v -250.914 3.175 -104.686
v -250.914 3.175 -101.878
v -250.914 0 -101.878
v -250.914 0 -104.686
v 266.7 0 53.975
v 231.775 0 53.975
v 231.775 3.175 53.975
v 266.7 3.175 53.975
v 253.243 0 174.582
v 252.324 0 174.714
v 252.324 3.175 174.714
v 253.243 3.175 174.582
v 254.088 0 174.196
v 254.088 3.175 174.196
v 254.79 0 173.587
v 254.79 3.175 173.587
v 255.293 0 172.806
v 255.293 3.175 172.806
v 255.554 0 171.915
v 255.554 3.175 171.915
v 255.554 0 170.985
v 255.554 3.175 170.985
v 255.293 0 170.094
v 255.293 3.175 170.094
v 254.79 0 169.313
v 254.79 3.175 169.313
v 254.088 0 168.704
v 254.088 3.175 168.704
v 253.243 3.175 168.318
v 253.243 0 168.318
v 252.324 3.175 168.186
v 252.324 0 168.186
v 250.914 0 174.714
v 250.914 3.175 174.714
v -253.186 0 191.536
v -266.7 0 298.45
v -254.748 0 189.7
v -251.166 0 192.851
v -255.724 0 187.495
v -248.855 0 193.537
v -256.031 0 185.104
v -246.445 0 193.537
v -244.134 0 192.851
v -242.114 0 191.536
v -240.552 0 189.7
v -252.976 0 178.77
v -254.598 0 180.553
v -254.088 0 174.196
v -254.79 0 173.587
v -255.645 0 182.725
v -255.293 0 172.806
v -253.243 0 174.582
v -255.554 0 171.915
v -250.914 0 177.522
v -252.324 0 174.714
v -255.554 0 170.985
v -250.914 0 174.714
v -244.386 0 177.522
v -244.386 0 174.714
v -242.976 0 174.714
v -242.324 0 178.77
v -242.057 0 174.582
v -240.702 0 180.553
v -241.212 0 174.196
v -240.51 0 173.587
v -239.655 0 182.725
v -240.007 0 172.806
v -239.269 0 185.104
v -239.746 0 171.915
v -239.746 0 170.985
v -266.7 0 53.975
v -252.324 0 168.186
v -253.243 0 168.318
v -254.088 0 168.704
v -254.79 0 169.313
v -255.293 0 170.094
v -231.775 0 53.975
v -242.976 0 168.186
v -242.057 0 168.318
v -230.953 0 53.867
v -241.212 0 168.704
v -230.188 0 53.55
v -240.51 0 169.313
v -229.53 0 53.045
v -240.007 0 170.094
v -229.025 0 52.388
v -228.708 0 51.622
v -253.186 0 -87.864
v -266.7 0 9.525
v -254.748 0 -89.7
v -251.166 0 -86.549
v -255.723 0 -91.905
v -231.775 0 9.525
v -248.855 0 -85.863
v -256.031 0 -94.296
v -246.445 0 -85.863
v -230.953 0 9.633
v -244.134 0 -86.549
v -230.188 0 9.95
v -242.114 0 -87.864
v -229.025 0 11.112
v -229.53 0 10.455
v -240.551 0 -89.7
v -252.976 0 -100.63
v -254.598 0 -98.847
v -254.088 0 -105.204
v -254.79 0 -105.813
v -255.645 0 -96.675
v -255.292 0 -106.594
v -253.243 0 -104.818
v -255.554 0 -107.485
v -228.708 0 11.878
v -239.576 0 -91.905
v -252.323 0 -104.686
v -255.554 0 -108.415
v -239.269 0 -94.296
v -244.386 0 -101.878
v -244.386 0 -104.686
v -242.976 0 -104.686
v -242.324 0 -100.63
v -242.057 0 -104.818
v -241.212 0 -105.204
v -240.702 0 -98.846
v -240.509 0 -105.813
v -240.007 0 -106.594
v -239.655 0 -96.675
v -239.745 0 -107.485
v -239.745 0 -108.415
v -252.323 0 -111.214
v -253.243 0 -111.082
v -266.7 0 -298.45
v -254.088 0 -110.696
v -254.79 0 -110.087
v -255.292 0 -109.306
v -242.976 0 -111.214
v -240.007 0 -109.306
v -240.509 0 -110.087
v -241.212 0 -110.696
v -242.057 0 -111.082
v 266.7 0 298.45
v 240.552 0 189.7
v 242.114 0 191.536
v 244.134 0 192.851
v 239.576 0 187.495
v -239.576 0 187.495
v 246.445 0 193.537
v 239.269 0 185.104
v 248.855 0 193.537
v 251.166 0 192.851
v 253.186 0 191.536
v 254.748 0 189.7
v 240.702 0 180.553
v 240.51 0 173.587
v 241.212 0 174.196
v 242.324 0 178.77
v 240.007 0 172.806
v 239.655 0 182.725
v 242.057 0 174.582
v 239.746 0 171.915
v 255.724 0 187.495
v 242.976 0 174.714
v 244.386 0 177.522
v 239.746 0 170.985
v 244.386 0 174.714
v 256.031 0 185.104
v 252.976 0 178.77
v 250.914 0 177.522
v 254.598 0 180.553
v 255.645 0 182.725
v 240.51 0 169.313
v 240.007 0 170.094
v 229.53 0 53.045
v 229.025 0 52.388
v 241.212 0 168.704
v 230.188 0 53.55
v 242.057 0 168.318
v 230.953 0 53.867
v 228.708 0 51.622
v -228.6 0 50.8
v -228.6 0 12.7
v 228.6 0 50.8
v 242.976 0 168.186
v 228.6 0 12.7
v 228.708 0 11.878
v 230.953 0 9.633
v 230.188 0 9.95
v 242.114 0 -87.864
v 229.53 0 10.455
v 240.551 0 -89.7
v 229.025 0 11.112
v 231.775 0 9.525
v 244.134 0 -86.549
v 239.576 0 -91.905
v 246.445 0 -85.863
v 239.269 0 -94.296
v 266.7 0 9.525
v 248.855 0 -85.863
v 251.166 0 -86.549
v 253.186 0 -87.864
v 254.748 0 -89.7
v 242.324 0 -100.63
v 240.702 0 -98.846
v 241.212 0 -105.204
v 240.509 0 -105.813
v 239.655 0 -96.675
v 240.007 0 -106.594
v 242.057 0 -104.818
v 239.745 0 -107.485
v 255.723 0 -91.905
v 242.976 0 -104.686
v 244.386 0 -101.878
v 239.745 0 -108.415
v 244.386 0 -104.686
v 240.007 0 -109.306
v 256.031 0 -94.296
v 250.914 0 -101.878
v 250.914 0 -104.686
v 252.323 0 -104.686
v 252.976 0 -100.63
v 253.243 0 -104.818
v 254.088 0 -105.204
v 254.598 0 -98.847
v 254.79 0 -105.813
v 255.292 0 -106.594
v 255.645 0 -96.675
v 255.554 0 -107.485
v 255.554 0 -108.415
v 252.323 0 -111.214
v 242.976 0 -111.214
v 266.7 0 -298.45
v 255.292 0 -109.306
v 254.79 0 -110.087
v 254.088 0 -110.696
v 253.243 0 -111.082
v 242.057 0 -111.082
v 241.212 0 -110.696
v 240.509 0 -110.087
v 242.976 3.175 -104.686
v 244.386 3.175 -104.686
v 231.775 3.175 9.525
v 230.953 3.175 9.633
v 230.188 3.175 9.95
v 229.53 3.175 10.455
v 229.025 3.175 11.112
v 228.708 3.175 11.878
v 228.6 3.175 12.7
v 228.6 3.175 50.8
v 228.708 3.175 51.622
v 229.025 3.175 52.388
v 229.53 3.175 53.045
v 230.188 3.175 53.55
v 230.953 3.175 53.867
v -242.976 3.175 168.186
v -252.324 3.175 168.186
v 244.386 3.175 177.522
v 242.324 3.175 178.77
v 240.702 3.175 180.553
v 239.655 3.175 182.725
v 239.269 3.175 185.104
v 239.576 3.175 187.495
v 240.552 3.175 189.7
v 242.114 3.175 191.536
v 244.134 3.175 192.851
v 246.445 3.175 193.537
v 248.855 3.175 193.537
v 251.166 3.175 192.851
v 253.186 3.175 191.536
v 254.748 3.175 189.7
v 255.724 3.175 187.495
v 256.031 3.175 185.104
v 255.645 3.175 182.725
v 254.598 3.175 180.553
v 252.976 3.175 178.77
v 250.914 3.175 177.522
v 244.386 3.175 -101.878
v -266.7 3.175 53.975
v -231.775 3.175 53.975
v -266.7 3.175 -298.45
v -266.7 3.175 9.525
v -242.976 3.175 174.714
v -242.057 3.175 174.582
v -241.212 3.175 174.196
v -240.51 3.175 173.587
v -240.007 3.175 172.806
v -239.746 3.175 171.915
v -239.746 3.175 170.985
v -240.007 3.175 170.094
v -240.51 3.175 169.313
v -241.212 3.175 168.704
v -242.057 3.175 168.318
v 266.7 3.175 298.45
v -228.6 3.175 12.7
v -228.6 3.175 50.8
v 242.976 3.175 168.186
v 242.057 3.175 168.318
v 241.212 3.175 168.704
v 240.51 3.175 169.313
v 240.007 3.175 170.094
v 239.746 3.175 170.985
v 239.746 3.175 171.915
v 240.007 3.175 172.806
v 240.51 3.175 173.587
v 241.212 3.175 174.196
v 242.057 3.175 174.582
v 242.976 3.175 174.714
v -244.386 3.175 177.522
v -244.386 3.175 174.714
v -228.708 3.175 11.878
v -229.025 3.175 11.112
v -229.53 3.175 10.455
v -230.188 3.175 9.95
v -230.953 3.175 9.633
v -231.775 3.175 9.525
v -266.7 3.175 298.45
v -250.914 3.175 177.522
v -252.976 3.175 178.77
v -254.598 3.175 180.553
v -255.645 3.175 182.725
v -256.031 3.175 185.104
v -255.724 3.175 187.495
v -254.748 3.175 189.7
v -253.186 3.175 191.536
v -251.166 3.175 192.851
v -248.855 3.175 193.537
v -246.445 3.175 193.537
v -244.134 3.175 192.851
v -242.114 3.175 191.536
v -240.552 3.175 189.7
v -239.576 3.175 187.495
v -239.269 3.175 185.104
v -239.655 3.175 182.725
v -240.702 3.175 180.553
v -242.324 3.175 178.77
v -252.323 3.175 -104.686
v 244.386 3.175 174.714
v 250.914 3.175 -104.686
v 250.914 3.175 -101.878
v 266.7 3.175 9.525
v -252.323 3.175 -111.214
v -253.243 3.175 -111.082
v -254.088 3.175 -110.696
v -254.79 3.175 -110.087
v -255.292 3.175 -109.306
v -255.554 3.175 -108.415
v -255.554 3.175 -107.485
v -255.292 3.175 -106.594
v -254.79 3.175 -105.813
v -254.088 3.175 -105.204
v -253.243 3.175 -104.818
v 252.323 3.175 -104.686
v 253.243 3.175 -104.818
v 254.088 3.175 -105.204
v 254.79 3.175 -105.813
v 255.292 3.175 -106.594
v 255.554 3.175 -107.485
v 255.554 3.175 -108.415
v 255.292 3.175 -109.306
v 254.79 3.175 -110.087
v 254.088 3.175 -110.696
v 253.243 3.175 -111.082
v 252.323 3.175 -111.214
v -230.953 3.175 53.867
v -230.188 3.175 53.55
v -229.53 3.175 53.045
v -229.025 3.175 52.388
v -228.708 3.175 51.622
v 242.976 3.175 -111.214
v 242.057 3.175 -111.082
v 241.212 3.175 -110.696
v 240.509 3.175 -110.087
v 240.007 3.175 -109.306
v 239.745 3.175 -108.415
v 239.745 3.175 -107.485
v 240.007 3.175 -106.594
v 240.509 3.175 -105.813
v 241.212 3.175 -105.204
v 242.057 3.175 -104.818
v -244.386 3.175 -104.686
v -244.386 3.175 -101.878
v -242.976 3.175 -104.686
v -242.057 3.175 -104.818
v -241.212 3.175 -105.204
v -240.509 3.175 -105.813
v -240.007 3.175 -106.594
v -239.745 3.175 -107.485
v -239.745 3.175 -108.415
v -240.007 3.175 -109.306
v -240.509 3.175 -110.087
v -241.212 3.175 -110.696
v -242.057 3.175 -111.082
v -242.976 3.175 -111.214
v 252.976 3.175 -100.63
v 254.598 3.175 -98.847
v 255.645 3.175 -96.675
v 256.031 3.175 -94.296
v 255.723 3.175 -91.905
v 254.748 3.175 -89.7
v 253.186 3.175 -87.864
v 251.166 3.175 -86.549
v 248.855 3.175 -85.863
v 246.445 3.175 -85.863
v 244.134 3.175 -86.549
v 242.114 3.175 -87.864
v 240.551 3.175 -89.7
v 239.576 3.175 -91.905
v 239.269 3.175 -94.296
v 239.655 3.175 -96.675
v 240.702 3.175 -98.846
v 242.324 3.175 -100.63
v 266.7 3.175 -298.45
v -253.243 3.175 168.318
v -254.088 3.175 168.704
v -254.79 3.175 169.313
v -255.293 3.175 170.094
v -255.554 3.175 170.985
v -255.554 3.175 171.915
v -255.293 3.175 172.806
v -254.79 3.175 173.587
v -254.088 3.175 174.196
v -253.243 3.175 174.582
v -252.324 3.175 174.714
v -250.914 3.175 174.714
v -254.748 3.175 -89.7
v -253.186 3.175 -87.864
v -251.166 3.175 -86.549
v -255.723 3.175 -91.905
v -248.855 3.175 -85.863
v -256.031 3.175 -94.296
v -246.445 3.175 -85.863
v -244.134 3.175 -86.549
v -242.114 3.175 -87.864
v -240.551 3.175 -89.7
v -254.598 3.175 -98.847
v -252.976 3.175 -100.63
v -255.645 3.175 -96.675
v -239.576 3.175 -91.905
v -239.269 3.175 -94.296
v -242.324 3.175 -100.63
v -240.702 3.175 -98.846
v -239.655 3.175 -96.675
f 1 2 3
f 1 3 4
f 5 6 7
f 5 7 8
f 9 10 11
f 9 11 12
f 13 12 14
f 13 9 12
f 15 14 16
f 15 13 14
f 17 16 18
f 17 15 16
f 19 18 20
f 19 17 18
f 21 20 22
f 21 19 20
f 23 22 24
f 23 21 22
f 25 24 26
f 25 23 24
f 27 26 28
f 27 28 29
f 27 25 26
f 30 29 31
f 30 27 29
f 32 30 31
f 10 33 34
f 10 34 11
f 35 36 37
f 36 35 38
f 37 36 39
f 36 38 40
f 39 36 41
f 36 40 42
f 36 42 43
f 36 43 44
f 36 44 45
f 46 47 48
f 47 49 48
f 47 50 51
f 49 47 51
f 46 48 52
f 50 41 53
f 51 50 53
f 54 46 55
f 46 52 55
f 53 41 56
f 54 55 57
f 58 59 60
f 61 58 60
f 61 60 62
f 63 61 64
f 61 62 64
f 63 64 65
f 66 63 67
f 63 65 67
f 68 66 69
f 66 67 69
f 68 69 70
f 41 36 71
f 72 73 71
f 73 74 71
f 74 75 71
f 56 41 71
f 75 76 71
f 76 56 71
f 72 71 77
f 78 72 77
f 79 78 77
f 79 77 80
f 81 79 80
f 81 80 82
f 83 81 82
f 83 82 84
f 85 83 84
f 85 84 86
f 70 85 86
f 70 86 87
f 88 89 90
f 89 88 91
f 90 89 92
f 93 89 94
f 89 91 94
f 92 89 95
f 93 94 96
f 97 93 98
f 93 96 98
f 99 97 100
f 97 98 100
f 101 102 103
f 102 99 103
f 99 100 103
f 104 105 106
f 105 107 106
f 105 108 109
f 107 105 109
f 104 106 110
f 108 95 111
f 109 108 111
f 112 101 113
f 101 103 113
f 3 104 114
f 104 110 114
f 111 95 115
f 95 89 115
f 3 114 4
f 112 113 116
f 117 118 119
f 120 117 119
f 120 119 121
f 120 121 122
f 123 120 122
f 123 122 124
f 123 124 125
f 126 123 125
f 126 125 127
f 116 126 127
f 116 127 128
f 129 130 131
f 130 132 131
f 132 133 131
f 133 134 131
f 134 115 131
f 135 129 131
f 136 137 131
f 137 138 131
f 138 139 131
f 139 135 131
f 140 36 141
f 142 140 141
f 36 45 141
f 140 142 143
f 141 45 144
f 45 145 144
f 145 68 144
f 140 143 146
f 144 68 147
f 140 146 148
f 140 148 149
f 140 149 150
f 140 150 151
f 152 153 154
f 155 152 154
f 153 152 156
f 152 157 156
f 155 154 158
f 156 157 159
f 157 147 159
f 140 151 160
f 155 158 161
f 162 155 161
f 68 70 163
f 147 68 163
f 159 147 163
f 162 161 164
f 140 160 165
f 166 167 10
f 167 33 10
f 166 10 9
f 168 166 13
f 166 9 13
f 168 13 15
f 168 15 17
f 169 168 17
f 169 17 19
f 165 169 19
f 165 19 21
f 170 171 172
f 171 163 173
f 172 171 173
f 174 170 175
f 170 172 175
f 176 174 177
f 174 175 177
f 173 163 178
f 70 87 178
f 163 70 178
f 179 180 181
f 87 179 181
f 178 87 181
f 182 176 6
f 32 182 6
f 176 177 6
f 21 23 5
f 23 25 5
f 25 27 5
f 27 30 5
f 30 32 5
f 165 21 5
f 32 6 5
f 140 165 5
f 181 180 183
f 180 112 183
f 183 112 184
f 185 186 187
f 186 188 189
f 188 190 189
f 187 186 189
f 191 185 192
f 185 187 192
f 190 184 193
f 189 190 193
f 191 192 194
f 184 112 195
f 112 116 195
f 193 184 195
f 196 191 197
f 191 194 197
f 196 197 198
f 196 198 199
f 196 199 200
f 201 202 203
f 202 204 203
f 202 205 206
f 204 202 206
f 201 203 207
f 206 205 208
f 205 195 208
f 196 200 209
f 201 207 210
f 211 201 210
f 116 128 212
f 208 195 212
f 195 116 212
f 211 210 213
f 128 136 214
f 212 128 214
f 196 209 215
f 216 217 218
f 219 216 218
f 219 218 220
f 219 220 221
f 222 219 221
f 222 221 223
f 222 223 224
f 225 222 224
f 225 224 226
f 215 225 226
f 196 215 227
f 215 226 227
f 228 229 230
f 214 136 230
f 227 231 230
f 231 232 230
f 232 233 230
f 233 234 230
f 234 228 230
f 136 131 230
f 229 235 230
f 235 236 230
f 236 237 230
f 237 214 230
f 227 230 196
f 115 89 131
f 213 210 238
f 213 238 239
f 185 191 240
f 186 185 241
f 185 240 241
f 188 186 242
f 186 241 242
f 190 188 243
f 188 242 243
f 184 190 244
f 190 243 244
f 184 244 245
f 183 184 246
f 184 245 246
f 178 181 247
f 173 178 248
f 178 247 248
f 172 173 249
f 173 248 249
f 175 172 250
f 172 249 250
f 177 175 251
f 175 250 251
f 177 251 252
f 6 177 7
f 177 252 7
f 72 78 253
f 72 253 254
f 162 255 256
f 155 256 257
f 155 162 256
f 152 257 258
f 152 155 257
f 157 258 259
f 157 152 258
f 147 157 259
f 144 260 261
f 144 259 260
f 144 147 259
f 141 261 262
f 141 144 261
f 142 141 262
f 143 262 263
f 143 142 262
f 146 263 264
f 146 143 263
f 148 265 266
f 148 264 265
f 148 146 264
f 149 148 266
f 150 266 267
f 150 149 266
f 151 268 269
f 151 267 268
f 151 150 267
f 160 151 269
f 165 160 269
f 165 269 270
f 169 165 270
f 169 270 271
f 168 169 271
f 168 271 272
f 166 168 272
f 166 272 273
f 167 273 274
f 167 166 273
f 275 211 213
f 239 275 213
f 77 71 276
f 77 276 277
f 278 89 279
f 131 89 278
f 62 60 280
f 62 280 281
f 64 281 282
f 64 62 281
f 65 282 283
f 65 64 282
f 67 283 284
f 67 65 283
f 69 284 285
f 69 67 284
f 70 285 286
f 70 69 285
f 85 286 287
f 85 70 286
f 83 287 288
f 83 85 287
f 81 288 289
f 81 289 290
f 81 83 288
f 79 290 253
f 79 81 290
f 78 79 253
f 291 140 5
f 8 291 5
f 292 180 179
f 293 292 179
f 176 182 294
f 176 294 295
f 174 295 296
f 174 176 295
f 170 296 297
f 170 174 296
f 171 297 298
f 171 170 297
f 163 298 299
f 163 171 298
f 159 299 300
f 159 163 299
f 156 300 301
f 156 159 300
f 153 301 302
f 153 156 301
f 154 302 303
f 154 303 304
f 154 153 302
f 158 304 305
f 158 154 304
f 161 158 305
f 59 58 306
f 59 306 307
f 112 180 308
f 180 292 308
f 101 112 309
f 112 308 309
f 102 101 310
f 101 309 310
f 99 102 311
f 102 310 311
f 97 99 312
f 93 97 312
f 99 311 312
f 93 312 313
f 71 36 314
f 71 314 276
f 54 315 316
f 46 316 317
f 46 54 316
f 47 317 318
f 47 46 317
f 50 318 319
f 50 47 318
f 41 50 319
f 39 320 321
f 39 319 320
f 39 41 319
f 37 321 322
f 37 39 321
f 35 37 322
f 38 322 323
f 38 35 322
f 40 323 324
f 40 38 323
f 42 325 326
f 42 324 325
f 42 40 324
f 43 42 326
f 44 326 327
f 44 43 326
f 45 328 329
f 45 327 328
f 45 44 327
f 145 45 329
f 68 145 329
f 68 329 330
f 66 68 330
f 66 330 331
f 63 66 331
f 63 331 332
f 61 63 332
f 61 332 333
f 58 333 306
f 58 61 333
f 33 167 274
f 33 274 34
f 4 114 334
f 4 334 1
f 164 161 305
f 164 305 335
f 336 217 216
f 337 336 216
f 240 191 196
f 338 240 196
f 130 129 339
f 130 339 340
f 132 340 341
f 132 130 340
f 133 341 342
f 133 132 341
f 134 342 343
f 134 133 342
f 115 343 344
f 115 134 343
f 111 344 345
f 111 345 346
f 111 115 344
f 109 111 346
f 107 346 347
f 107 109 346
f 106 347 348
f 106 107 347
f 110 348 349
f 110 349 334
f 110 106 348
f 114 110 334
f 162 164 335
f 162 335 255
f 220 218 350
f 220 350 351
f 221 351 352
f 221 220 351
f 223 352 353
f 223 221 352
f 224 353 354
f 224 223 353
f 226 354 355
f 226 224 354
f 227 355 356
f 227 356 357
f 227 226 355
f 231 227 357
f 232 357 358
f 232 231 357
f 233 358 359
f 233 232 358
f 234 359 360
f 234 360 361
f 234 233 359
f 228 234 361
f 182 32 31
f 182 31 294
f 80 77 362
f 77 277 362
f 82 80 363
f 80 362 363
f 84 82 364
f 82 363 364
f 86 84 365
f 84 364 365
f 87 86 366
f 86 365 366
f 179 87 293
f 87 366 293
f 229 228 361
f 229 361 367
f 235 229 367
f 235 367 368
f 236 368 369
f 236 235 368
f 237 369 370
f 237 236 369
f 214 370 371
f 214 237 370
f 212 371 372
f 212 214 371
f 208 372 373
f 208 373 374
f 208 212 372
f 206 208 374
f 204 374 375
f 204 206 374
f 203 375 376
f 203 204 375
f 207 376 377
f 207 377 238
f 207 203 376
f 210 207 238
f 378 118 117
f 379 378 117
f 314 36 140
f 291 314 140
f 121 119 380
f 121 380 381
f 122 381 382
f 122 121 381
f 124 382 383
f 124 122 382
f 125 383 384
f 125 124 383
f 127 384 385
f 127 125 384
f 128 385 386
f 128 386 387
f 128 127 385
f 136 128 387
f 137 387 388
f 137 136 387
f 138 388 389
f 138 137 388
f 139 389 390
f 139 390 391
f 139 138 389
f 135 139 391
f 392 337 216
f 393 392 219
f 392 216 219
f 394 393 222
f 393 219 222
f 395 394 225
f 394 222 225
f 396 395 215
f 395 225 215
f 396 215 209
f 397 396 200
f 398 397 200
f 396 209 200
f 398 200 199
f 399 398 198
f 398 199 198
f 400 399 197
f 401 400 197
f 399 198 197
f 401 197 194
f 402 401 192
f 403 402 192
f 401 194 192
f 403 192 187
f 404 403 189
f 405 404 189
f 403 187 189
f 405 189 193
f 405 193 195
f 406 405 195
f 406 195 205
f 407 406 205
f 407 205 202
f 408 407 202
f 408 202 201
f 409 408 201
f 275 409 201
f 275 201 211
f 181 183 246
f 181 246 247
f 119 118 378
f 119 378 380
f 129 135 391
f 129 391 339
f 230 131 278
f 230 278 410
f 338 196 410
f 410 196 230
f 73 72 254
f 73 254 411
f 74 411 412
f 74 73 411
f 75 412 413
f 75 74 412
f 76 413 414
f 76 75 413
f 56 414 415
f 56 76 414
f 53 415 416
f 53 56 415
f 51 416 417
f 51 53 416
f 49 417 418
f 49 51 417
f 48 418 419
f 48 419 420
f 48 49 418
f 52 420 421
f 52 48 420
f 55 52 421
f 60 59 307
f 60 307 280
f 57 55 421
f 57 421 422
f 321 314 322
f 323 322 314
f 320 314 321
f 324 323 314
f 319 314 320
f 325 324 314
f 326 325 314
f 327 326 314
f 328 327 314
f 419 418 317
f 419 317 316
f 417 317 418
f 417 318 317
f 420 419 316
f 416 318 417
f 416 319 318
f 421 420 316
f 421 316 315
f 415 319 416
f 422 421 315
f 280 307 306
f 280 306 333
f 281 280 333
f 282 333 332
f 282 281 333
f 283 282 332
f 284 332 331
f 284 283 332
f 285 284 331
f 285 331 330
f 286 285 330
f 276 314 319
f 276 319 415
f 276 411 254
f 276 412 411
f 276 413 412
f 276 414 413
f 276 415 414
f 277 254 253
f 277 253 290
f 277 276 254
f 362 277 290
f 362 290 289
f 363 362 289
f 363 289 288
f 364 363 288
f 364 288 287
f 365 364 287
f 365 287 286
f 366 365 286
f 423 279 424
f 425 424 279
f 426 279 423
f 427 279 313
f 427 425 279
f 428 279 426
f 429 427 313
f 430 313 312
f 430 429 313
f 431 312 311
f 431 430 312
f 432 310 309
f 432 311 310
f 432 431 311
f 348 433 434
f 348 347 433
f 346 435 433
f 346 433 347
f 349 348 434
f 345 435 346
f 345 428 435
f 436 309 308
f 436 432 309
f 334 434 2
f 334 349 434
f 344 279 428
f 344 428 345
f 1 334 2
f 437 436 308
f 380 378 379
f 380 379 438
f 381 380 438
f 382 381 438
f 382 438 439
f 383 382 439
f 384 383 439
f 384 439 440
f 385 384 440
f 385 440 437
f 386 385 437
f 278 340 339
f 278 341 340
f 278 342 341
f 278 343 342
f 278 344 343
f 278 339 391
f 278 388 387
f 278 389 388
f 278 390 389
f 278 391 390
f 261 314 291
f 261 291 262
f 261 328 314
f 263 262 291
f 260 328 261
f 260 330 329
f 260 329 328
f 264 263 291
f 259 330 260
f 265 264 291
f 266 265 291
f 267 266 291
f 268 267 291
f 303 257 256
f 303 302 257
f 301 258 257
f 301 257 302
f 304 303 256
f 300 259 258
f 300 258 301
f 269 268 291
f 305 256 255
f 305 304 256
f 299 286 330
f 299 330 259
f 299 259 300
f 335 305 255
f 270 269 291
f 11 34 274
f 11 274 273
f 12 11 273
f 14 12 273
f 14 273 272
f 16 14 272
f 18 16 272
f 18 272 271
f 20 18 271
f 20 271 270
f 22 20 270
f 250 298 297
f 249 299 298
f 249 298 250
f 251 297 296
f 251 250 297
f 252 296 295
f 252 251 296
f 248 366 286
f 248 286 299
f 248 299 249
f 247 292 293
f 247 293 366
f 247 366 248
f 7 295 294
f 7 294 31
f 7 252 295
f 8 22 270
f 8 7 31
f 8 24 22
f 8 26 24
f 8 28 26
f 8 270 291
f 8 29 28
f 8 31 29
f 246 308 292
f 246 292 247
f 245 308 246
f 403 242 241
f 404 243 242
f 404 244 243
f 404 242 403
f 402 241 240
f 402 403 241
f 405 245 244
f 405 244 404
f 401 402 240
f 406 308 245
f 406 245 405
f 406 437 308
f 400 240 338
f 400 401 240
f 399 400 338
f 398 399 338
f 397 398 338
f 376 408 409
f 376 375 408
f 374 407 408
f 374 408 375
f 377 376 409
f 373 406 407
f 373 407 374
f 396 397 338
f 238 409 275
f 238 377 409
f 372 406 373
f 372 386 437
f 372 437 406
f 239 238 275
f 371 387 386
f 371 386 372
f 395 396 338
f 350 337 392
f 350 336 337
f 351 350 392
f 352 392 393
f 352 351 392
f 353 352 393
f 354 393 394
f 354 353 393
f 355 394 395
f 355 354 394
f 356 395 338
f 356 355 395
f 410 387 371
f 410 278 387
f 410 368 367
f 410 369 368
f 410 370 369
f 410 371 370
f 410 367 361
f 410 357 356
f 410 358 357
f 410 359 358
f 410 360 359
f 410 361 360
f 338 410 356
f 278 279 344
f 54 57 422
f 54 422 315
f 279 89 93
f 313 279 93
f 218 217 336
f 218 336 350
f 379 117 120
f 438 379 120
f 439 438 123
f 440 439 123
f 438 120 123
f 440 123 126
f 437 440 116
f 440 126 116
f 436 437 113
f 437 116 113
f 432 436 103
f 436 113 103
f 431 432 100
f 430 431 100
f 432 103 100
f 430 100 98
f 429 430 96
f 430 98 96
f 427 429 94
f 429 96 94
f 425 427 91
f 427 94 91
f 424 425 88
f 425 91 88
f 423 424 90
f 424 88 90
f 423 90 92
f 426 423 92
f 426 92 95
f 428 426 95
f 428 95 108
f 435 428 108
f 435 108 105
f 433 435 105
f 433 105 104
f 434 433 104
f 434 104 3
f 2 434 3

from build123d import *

# Parameters (mm, degrees)
SKETCH1_W                    = 533.4
SKETCH1_H                    = 596.9
BOSS_EXTRUDE1_DEPTH          = 3.175
CUT_EXTRUDE1_DEPTH           = 401.264129201
F_0_257_DIAMETER_SLOT1_DEPTH = 3.175
SKETCH8_W                    = 38.1
SKETCH8_H                    = 44.45
CUT_EXTRUDE2_DEPTH           = 401.264129201
FILLET1_R                    = 3.175


# Read off the part's stored shape, not the designer's step: F (0.257) Diameter Slot1
with BuildPart() as part:
    # Sketch1 → Boss-Extrude1 (new body)
    with BuildSketch(Plane(origin=(0, 0, 0), x_dir=(1, 0, 0), z_dir=(0, 1, 0))):
        Rectangle(SKETCH1_W, SKETCH1_H)
    extrude(amount=BOSS_EXTRUDE1_DEPTH)

    # Sketch5 → Cut-Extrude1 (cut, through all)
    with BuildSketch(Plane.XZ):
        with BuildLine():
            Line((244.385805934, -101.878160113), (244.385805934, -107.950617892))
            ThreePointArc((244.385805934, -107.950617892), (247.65, -111.213899987), (250.913605875, -107.950029643))
            Line((250.913605875, -107.950029643), (250.913605875, -101.878279337))
            ThreePointArc((250.913605875, -101.878279337), (247.65, -85.775799987), (244.385805934, -101.878160113))
        make_face()
        with BuildLine():
            Line((250.9139, 177.521780271), (250.9139, 171.450000343))
            ThreePointArc((250.9139, 171.450000343), (247.65, 168.1861), (244.3861, 171.450000343))
            Line((244.3861, 171.450000343), (244.3861, 177.521780271))
            ThreePointArc((244.3861, 177.521780271), (247.65, 193.6242), (250.9139, 177.521780271))
        make_face()
        with BuildLine():
            Line((-244.3861, 177.521780271), (-244.3861, 171.450000343))
            ThreePointArc((-244.3861, 171.450000343), (-247.65, 168.1861), (-250.9139, 171.450000343))
            Line((-250.9139, 171.450000343), (-250.9139, 177.521780271))
            ThreePointArc((-250.9139, 177.521780271), (-247.65, 193.6242), (-244.3861, 177.521780271))
        make_face()
        with BuildLine():
            Line((-250.913605875, -101.878279337), (-250.913605875, -107.950029643))
            ThreePointArc((-250.913605875, -107.950029643), (-247.65, -111.213899987), (-244.385805934, -107.950617892))
            Line((-244.385805934, -107.950617892), (-244.385805934, -101.878160113))
            ThreePointArc((-244.385805934, -101.878160113), (-247.65, -85.775799987), (-250.913605875, -101.878279337))
        make_face()
    extrude(amount=-CUT_EXTRUDE1_DEPTH, mode=Mode.SUBTRACT)

    # F (0.257) Diameter Slot1 outline → F (0.257) Diameter Slot1 (cut)
    with BuildSketch(Plane(origin=(0, 0, 0), x_dir=(1, 0, 0), z_dir=(0, 1, 0))):
        with BuildLine():
            ThreePointArc((252.3236, -174.7139), (255.5875, -171.45), (252.3236, -168.1861))
            Line((252.3236, -168.1861), (247.65, -168.1861))
            ThreePointArc((247.65, -168.1861), (249.957925944, -169.142074298), (250.9139, -171.450000343))
            Line((250.9139, -171.450000343), (250.9139, -174.7139))
            Line((250.9139, -174.7139), (252.3236, -174.7139))
        make_face()
        with BuildLine():
            ThreePointArc((244.3861, -171.450000343), (245.342074056, -169.142074298), (247.65, -168.1861))
            Line((247.65, -168.1861), (242.9764, -168.1861))
            ThreePointArc((242.9764, -168.1861), (239.7125, -171.45), (242.9764, -174.7139))
            Line((242.9764, -174.7139), (244.3861, -174.7139))
            Line((244.3861, -174.7139), (244.3861, -171.450000343))
        make_face()
        with BuildLine():
            ThreePointArc((-242.9764, -174.7139), (-239.7125, -171.45), (-242.9764, -168.1861))
            Line((-242.9764, -168.1861), (-247.65, -168.1861))
            ThreePointArc((-247.65, -168.1861), (-245.342074056, -169.142074298), (-244.3861, -171.450000343))
            Line((-244.3861, -171.450000343), (-244.3861, -174.7139))
            Line((-244.3861, -174.7139), (-242.9764, -174.7139))
        make_face()
        with BuildLine():
            ThreePointArc((-250.9139, -171.450000343), (-249.957925944, -169.142074298), (-247.65, -168.1861))
            Line((-247.65, -168.1861), (-252.3236, -168.1861))
            ThreePointArc((-252.3236, -168.1861), (-255.5875, -171.45), (-252.3236, -174.7139))
            Line((-252.3236, -174.7139), (-250.9139, -174.7139))
            Line((-250.9139, -174.7139), (-250.9139, -171.450000343))
        make_face()
        with BuildLine():
            ThreePointArc((252.323305875, 104.6861), (255.587205875, 107.95), (252.323305875, 111.2139))
            Line((252.323305875, 111.2139), (247.649705875, 111.2139))
            ThreePointArc((247.649705875, 111.2139), (249.957621218, 110.257936304), (250.913605875, 107.950029643))
            Line((250.913605875, 107.950029643), (250.913605875, 104.6861))
            Line((250.913605875, 104.6861), (252.323305875, 104.6861))
        make_face()
        with BuildLine():
            ThreePointArc((244.385805934, 107.950617892), (245.34199852, 110.258144271), (247.649705875, 111.2139))
            Line((247.649705875, 111.2139), (242.976105875, 111.2139))
            ThreePointArc((242.976105875, 111.2139), (239.712205875, 107.95), (242.976105875, 104.6861))
            Line((242.976105875, 104.6861), (244.385805934, 104.6861))
            Line((244.385805934, 104.6861), (244.385805934, 107.950617892))
        make_face()
        with BuildLine():
            ThreePointArc((-242.976105875, 104.6861), (-239.712205875, 107.95), (-242.976105875, 111.2139))
            Line((-242.976105875, 111.2139), (-247.649705876, 111.2139))
            ThreePointArc((-247.649705876, 111.2139), (-245.341998521, 110.258144271), (-244.385805934, 107.950617892))
            Line((-244.385805934, 107.950617892), (-244.385805934, 104.6861))
            Line((-244.385805934, 104.6861), (-242.976105875, 104.6861))
        make_face()
        with BuildLine():
            ThreePointArc((-250.913605875, 107.950029643), (-249.957621218, 110.257936303), (-247.649705876, 111.2139))
            Line((-247.649705876, 111.2139), (-252.323305875, 111.2139))
            ThreePointArc((-252.323305875, 111.2139), (-255.587205875, 107.95), (-252.323305875, 104.6861))
            Line((-252.323305875, 104.6861), (-250.913605875, 104.6861))
            Line((-250.913605875, 104.6861), (-250.913605875, 107.950029643))
        make_face()
    extrude(amount=F_0_257_DIAMETER_SLOT1_DEPTH, mode=Mode.SUBTRACT)

    # Sketch8 → Cut-Extrude2 (cut, through all)
    with BuildSketch(Plane.XZ):
        with Locations((-247.65, 31.75)):
            Rectangle(SKETCH8_W, SKETCH8_H)
        with Locations((247.65, 31.75)):
            Rectangle(SKETCH8_W, SKETCH8_H)
    extrude(amount=-CUT_EXTRUDE2_DEPTH, mode=Mode.SUBTRACT)

    # Fillet1
    fillet1_edges = [part.edges().sort_by_distance(p)[0] for p in [
        (-228.6, 1.5875, 53.975),
        (-228.6, 1.5875, 9.525),
        (228.6, 1.5875, 9.525),
        (228.6, 1.5875, 53.975),
    ]]
    fillet(fillet1_edges, radius=FILLET1_R)


solid = part.part
